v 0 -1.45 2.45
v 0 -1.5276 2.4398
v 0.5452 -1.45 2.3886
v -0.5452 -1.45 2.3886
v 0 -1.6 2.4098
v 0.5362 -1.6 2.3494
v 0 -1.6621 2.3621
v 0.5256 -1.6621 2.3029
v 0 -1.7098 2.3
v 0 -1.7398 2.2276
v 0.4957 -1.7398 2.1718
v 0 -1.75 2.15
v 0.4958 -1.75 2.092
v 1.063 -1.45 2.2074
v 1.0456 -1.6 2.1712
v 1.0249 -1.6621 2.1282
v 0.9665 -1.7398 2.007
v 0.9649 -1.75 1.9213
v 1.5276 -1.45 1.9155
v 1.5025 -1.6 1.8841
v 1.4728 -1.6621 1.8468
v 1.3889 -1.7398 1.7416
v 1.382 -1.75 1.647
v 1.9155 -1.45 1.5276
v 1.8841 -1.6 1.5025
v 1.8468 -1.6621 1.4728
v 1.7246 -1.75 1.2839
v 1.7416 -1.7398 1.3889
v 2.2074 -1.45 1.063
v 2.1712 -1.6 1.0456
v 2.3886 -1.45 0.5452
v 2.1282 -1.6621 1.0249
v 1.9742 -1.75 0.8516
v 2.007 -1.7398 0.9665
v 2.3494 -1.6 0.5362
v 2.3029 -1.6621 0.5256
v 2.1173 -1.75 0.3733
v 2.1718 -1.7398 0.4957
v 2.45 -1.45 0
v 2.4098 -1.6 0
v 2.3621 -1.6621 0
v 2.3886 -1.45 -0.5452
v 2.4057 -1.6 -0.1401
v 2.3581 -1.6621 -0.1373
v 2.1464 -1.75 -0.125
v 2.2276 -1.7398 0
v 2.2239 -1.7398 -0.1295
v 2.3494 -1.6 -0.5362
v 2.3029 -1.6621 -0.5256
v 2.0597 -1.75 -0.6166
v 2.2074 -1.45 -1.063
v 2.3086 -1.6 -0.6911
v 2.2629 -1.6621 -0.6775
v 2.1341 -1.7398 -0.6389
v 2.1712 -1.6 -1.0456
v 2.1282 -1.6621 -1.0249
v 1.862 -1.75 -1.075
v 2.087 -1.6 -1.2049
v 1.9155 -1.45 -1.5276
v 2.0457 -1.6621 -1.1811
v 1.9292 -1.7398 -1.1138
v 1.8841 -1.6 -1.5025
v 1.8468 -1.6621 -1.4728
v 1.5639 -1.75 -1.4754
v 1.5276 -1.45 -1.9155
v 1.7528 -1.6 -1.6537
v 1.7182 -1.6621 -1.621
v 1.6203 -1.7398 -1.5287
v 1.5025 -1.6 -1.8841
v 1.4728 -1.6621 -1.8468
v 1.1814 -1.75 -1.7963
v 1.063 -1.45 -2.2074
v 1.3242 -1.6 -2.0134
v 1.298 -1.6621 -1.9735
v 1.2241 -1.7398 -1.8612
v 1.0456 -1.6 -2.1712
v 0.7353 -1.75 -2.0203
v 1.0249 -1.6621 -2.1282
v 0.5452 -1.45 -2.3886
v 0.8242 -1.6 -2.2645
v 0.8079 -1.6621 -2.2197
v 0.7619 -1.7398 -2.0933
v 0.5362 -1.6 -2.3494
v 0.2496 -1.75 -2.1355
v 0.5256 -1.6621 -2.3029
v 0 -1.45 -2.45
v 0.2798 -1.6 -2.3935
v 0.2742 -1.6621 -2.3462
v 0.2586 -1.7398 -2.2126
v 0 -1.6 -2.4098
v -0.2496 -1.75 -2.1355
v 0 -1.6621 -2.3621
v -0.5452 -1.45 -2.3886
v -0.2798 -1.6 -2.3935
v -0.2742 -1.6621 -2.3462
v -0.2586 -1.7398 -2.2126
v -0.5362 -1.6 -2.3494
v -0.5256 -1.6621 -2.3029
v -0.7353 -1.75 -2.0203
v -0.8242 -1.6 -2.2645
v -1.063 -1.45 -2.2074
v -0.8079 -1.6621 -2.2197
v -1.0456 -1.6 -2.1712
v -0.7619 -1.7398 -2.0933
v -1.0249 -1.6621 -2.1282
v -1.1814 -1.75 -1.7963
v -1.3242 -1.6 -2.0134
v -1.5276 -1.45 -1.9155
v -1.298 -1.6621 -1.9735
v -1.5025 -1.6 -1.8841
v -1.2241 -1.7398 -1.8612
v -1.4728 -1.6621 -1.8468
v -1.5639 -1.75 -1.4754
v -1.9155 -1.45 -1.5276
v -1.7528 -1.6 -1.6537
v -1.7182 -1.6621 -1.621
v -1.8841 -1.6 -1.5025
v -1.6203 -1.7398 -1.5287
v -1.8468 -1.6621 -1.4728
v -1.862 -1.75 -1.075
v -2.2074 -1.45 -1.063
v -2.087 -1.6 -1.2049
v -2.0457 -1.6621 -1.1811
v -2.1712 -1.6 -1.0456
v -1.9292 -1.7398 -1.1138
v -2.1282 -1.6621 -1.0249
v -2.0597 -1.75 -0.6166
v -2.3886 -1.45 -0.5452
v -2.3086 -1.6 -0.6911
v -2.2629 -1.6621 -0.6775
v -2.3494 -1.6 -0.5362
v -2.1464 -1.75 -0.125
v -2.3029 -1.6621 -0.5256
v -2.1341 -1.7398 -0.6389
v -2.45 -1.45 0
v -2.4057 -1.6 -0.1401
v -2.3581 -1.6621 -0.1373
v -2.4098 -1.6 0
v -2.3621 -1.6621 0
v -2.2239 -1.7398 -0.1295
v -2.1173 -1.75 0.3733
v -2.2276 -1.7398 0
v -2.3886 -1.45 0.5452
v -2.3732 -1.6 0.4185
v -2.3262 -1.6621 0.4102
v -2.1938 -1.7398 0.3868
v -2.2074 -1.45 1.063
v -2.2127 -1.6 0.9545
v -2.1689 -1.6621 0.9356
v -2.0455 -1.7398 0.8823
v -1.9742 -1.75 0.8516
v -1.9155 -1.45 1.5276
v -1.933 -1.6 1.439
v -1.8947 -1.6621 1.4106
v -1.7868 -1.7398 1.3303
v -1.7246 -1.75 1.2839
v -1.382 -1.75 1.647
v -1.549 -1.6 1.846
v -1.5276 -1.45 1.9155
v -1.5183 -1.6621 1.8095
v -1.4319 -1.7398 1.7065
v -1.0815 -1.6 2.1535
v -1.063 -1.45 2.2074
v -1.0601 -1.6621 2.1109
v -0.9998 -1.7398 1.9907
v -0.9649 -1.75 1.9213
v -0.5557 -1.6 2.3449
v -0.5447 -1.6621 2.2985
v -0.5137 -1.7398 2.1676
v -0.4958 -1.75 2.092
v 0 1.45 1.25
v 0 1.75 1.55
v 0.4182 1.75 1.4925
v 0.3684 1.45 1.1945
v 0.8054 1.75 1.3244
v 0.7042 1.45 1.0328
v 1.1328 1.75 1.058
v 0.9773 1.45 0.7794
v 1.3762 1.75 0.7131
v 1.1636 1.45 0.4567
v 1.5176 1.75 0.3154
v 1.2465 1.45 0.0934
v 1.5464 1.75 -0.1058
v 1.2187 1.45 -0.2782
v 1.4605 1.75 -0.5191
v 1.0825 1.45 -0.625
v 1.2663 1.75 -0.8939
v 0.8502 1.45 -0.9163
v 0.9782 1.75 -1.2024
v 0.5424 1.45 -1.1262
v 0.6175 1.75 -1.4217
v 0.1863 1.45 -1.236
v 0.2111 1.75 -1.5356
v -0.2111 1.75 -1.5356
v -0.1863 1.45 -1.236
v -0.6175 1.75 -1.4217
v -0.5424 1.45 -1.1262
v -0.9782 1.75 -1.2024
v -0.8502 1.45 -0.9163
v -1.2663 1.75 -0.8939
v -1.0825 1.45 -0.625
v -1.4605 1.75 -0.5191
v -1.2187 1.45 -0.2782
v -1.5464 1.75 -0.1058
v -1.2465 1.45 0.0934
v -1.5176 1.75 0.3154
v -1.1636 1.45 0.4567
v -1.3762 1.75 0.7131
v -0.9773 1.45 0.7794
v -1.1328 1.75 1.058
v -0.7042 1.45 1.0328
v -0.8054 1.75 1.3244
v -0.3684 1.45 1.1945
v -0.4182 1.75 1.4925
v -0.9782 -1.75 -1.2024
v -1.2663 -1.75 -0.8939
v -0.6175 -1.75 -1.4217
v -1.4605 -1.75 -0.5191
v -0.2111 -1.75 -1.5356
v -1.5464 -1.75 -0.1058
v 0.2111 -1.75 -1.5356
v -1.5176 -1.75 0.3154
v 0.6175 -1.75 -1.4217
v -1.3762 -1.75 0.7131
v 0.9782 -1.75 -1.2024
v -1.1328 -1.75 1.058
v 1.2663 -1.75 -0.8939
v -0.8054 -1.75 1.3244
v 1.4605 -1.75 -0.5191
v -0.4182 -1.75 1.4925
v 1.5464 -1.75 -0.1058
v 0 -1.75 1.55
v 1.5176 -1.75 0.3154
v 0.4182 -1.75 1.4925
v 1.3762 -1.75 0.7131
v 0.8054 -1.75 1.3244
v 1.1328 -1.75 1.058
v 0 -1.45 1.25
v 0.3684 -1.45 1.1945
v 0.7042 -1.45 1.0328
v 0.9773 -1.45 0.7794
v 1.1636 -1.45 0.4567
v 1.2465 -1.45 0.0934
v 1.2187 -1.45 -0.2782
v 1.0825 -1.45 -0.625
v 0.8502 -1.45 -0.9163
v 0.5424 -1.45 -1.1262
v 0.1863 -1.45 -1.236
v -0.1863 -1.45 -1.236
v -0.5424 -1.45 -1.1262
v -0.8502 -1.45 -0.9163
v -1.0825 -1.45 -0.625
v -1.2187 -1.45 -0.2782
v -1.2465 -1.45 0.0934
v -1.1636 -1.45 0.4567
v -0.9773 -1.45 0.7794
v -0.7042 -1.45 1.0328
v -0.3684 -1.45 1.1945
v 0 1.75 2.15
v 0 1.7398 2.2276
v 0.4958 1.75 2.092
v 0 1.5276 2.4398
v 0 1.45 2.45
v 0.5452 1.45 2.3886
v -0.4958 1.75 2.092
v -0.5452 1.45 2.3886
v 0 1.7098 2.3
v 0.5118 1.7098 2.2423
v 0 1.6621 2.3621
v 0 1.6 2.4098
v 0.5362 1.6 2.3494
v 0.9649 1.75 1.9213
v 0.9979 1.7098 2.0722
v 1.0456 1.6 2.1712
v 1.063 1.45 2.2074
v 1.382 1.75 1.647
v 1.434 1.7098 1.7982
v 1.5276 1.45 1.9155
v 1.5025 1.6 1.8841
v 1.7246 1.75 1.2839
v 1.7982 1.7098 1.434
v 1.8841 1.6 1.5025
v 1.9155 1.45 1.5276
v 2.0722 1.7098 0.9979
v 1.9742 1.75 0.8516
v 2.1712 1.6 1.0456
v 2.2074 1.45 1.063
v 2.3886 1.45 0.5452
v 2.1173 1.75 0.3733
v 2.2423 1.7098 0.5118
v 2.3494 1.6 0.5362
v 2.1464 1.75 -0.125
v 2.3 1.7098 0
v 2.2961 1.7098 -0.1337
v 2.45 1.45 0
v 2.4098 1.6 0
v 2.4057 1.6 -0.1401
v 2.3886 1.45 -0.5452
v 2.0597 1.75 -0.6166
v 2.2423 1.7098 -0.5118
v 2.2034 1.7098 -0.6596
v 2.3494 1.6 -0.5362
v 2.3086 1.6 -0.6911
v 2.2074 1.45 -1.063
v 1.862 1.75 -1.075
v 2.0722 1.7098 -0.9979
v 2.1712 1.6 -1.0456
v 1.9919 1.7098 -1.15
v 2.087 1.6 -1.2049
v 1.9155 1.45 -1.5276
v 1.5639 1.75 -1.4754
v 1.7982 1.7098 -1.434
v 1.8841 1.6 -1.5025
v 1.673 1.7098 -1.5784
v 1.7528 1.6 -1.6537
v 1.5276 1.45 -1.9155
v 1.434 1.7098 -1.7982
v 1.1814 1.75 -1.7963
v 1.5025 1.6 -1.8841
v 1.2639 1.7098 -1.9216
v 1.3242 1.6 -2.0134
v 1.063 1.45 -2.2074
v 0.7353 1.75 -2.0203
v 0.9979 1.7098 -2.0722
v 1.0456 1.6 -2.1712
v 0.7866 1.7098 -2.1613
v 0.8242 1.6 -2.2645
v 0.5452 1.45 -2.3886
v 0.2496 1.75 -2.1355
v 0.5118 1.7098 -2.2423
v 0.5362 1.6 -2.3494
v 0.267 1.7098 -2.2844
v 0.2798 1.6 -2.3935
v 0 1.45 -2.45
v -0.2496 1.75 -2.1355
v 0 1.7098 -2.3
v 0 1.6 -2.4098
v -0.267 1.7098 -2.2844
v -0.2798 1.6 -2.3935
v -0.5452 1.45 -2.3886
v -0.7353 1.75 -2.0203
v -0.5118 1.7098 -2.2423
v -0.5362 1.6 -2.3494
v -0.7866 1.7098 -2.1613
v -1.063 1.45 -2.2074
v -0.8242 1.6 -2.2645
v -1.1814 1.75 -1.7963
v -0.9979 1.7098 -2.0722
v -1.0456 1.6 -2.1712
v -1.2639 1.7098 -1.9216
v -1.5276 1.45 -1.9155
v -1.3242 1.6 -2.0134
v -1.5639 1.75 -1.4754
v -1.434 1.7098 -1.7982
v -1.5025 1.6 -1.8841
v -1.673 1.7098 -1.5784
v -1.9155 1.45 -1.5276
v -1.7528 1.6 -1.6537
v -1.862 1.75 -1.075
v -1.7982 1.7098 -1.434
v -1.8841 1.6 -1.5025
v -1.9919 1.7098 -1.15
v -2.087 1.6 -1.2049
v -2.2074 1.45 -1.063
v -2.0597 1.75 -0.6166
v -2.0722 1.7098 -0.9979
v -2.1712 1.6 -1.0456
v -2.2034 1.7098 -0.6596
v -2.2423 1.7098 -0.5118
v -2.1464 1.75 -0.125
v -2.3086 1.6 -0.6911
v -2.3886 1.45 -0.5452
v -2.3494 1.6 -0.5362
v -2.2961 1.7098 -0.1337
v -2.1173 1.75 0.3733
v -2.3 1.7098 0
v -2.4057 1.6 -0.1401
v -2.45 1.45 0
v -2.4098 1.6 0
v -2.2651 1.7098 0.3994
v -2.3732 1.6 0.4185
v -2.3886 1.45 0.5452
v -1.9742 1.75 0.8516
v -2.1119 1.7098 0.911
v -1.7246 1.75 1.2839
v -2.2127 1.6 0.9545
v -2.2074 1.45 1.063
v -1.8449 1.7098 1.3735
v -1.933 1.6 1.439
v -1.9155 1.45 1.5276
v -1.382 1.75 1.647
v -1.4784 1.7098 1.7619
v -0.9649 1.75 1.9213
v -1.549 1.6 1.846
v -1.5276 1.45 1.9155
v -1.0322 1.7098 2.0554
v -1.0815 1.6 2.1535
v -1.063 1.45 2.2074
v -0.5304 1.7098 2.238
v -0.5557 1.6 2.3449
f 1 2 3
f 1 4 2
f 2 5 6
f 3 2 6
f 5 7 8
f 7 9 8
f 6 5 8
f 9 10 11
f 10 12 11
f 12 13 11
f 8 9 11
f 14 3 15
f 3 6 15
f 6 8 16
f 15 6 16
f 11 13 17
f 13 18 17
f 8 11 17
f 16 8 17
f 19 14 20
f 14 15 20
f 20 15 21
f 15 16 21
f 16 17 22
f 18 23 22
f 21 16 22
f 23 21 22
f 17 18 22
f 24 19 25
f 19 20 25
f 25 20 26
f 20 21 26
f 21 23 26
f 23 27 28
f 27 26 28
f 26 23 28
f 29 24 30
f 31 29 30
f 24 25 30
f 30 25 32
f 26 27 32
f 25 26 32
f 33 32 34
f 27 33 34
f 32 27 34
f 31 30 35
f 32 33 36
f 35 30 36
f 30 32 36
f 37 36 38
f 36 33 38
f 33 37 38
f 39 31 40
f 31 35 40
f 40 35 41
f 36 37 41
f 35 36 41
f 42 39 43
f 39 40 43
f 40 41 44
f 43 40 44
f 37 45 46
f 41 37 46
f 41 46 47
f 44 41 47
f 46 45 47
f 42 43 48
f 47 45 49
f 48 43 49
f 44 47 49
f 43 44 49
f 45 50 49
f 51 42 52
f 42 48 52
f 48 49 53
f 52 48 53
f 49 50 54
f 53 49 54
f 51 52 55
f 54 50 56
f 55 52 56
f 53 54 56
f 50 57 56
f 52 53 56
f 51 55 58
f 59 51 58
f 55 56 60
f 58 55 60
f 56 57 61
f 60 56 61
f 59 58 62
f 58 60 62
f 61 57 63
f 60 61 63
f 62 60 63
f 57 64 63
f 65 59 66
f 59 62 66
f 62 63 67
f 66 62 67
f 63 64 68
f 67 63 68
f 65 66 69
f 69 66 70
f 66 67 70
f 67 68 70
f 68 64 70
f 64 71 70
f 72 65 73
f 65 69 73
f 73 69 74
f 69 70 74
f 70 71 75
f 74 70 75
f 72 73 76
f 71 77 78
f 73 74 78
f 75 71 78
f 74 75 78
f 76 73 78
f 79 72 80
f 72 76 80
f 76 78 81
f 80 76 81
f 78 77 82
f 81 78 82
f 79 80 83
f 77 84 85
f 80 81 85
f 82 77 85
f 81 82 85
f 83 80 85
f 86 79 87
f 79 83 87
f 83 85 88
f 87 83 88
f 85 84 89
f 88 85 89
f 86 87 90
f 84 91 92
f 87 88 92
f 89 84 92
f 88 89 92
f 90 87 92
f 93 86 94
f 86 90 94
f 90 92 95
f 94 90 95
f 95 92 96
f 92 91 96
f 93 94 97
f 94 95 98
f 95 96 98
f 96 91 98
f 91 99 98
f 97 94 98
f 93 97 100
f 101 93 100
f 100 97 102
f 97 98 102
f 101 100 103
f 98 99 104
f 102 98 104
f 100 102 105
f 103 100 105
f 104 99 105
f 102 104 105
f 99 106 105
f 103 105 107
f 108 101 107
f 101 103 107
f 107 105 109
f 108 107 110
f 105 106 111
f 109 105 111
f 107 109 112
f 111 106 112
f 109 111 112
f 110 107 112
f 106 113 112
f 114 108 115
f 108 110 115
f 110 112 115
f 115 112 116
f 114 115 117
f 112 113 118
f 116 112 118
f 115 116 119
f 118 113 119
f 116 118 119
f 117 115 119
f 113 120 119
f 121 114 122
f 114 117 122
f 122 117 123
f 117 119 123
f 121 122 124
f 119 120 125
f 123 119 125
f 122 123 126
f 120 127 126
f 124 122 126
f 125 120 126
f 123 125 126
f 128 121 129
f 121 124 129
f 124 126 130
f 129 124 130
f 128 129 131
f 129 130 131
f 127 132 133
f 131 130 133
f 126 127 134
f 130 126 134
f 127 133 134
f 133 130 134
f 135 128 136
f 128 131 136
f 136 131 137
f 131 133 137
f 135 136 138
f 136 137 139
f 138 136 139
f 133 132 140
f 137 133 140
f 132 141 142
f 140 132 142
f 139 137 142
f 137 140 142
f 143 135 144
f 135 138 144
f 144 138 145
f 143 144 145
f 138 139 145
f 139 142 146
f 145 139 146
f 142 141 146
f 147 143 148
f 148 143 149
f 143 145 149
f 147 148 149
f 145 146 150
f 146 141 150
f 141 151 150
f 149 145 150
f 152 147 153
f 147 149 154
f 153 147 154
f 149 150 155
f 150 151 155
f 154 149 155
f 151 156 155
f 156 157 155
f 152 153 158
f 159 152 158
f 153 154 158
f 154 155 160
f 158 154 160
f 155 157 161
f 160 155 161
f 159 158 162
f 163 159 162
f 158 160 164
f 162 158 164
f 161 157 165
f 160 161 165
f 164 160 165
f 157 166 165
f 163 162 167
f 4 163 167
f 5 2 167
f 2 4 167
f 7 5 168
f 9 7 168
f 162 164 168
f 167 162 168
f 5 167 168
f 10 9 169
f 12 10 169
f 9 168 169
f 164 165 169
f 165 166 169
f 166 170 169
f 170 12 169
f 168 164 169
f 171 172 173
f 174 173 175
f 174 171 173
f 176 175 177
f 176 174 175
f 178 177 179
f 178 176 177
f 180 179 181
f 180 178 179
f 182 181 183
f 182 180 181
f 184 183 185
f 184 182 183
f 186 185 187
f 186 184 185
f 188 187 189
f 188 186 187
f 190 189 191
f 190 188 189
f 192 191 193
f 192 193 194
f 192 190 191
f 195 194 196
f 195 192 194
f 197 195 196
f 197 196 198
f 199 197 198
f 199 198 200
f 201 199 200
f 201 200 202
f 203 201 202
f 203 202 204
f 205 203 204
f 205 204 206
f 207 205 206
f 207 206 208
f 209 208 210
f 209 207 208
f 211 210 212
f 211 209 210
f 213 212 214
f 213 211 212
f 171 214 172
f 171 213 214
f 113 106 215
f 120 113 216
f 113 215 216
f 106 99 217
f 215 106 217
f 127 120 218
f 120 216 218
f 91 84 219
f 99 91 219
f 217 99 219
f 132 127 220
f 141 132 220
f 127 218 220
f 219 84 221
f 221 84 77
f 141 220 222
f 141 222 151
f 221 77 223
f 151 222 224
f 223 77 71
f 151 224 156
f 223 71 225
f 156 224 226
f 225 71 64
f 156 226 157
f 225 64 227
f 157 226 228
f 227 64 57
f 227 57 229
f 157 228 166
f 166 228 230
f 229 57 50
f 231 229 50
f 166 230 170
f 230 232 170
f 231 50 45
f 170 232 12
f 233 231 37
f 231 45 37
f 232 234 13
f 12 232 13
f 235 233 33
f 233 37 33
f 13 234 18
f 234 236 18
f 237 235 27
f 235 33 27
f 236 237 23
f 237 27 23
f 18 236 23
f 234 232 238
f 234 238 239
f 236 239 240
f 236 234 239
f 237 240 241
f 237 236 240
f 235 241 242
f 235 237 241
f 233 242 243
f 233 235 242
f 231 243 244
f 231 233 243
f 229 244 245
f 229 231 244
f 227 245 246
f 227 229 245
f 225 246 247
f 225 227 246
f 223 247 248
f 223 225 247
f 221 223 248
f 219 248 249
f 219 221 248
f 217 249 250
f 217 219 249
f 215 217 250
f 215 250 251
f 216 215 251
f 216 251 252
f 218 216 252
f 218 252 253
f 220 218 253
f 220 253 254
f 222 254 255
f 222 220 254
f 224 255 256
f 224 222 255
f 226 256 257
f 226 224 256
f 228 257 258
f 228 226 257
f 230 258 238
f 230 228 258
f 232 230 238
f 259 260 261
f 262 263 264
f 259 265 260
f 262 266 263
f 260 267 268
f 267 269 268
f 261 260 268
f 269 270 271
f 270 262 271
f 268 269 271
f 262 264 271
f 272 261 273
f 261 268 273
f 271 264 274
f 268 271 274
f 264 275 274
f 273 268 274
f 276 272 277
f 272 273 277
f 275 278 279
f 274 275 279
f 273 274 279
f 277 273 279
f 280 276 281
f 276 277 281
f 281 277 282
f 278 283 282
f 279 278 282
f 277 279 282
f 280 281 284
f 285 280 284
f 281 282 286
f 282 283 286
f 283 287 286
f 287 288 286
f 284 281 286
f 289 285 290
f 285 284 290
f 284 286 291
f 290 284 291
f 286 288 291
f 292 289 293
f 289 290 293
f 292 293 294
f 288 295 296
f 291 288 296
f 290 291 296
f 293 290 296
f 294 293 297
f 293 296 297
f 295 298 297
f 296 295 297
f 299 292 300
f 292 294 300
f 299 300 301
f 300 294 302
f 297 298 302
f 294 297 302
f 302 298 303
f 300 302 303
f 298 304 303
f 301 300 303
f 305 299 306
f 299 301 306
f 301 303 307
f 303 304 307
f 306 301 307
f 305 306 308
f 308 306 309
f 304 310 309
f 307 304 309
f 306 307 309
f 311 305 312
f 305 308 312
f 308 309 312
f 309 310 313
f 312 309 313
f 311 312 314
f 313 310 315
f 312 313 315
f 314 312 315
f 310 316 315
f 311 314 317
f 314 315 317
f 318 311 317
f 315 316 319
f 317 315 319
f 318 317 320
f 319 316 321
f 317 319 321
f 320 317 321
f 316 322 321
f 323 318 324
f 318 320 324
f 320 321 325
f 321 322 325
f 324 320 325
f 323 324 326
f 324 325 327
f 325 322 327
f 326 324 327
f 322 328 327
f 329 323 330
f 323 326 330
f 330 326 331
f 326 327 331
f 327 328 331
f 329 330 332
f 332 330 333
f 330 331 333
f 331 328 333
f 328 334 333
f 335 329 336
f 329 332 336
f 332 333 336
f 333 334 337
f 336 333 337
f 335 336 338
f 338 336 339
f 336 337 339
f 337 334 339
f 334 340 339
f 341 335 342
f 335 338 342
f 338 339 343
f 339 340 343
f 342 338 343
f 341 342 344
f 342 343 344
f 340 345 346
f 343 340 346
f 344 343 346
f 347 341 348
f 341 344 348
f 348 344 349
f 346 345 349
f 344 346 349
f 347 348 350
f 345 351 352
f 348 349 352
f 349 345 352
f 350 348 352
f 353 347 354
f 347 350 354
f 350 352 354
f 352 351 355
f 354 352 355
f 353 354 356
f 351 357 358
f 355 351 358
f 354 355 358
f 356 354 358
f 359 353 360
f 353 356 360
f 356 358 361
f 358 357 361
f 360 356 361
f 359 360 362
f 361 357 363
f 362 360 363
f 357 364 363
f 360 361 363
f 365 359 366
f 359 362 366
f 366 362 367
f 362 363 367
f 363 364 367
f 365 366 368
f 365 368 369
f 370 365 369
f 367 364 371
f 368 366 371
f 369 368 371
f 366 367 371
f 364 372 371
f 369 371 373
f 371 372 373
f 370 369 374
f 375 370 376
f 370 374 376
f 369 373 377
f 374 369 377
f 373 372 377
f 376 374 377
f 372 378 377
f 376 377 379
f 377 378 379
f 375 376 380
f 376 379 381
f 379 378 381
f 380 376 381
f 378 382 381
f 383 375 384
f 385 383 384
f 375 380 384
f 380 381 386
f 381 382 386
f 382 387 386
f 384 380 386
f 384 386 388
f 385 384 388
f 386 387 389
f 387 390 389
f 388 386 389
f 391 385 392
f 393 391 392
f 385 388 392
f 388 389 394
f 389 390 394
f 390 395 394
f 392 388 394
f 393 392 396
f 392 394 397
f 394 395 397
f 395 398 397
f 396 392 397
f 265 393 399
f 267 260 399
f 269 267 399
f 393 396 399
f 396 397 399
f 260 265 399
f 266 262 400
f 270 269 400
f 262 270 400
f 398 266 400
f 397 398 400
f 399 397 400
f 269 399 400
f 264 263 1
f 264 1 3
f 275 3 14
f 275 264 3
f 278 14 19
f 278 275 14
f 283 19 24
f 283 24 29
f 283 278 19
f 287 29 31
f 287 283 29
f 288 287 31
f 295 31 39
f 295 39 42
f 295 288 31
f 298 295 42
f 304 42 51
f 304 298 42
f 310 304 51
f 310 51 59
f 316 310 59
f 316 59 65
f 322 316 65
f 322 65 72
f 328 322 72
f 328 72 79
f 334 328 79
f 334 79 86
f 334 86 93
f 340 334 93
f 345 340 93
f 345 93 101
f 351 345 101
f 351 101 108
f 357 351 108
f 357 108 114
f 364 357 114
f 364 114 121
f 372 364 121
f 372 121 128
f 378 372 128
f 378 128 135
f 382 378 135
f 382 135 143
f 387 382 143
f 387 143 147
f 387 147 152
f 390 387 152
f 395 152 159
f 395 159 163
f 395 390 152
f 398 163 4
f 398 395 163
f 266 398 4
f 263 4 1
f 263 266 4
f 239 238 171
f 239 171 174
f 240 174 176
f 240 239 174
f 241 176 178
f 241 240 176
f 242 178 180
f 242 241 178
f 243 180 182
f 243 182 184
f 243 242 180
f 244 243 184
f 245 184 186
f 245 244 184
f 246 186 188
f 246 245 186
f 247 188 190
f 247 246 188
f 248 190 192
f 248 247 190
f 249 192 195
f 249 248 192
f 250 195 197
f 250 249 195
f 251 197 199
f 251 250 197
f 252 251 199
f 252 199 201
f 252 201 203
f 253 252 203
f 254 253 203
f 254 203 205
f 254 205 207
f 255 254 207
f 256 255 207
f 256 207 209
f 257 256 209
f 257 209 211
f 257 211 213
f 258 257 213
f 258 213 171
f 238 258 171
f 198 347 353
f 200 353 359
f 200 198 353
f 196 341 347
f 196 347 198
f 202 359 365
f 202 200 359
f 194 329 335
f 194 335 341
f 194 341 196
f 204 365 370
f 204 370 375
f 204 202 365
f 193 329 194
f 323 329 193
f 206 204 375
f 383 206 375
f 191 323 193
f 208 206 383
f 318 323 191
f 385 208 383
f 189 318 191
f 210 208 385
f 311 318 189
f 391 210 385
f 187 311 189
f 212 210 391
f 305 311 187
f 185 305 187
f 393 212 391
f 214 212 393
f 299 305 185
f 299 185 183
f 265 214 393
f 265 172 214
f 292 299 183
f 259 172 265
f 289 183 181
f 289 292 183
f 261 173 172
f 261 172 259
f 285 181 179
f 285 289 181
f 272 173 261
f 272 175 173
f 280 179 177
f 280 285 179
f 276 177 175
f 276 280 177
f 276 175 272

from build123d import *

# Parameters (mm, degrees)
SKETCH1_R           = 2.45
SKETCH1_R_2         = 1.25
BOSS_EXTRUDE1_DEPTH = 1.75
CHAMFER1_SIZE       = 0.3
FILLET1_R           = 0.3


with BuildPart() as part:
    # Sketch1 → Boss-Extrude1 (new, symmetric)
    with BuildSketch(Plane(origin=(0, 0, 0), x_dir=(1, 0, 0), z_dir=(0, 1, 0))):
        with Locations(Location((0, 0, 0), (0, 0, 270))):
            Circle(SKETCH1_R)
        with Locations(Location((0, 0, 0), (0, 0, 270))):
            Circle(SKETCH1_R_2, mode=Mode.SUBTRACT)
    extrude(amount=BOSS_EXTRUDE1_DEPTH, both=True)

    # Chamfer1
    chamfer1_edges = [part.edges().sort_by_distance(p)[0] for p in [
        (0, -1.75, -1.25),
        (0, 1.75, -1.25),
    ]]
    chamfer(chamfer1_edges, length=CHAMFER1_SIZE)

    # Fillet1
    fillet1_edges = [part.edges().sort_by_distance(p)[0] for p in [
        (0, -1.75, -2.45),
        (0, 1.75, -2.45),
    ]]
    fillet(fillet1_edges, radius=FILLET1_R)


solid = part.part
